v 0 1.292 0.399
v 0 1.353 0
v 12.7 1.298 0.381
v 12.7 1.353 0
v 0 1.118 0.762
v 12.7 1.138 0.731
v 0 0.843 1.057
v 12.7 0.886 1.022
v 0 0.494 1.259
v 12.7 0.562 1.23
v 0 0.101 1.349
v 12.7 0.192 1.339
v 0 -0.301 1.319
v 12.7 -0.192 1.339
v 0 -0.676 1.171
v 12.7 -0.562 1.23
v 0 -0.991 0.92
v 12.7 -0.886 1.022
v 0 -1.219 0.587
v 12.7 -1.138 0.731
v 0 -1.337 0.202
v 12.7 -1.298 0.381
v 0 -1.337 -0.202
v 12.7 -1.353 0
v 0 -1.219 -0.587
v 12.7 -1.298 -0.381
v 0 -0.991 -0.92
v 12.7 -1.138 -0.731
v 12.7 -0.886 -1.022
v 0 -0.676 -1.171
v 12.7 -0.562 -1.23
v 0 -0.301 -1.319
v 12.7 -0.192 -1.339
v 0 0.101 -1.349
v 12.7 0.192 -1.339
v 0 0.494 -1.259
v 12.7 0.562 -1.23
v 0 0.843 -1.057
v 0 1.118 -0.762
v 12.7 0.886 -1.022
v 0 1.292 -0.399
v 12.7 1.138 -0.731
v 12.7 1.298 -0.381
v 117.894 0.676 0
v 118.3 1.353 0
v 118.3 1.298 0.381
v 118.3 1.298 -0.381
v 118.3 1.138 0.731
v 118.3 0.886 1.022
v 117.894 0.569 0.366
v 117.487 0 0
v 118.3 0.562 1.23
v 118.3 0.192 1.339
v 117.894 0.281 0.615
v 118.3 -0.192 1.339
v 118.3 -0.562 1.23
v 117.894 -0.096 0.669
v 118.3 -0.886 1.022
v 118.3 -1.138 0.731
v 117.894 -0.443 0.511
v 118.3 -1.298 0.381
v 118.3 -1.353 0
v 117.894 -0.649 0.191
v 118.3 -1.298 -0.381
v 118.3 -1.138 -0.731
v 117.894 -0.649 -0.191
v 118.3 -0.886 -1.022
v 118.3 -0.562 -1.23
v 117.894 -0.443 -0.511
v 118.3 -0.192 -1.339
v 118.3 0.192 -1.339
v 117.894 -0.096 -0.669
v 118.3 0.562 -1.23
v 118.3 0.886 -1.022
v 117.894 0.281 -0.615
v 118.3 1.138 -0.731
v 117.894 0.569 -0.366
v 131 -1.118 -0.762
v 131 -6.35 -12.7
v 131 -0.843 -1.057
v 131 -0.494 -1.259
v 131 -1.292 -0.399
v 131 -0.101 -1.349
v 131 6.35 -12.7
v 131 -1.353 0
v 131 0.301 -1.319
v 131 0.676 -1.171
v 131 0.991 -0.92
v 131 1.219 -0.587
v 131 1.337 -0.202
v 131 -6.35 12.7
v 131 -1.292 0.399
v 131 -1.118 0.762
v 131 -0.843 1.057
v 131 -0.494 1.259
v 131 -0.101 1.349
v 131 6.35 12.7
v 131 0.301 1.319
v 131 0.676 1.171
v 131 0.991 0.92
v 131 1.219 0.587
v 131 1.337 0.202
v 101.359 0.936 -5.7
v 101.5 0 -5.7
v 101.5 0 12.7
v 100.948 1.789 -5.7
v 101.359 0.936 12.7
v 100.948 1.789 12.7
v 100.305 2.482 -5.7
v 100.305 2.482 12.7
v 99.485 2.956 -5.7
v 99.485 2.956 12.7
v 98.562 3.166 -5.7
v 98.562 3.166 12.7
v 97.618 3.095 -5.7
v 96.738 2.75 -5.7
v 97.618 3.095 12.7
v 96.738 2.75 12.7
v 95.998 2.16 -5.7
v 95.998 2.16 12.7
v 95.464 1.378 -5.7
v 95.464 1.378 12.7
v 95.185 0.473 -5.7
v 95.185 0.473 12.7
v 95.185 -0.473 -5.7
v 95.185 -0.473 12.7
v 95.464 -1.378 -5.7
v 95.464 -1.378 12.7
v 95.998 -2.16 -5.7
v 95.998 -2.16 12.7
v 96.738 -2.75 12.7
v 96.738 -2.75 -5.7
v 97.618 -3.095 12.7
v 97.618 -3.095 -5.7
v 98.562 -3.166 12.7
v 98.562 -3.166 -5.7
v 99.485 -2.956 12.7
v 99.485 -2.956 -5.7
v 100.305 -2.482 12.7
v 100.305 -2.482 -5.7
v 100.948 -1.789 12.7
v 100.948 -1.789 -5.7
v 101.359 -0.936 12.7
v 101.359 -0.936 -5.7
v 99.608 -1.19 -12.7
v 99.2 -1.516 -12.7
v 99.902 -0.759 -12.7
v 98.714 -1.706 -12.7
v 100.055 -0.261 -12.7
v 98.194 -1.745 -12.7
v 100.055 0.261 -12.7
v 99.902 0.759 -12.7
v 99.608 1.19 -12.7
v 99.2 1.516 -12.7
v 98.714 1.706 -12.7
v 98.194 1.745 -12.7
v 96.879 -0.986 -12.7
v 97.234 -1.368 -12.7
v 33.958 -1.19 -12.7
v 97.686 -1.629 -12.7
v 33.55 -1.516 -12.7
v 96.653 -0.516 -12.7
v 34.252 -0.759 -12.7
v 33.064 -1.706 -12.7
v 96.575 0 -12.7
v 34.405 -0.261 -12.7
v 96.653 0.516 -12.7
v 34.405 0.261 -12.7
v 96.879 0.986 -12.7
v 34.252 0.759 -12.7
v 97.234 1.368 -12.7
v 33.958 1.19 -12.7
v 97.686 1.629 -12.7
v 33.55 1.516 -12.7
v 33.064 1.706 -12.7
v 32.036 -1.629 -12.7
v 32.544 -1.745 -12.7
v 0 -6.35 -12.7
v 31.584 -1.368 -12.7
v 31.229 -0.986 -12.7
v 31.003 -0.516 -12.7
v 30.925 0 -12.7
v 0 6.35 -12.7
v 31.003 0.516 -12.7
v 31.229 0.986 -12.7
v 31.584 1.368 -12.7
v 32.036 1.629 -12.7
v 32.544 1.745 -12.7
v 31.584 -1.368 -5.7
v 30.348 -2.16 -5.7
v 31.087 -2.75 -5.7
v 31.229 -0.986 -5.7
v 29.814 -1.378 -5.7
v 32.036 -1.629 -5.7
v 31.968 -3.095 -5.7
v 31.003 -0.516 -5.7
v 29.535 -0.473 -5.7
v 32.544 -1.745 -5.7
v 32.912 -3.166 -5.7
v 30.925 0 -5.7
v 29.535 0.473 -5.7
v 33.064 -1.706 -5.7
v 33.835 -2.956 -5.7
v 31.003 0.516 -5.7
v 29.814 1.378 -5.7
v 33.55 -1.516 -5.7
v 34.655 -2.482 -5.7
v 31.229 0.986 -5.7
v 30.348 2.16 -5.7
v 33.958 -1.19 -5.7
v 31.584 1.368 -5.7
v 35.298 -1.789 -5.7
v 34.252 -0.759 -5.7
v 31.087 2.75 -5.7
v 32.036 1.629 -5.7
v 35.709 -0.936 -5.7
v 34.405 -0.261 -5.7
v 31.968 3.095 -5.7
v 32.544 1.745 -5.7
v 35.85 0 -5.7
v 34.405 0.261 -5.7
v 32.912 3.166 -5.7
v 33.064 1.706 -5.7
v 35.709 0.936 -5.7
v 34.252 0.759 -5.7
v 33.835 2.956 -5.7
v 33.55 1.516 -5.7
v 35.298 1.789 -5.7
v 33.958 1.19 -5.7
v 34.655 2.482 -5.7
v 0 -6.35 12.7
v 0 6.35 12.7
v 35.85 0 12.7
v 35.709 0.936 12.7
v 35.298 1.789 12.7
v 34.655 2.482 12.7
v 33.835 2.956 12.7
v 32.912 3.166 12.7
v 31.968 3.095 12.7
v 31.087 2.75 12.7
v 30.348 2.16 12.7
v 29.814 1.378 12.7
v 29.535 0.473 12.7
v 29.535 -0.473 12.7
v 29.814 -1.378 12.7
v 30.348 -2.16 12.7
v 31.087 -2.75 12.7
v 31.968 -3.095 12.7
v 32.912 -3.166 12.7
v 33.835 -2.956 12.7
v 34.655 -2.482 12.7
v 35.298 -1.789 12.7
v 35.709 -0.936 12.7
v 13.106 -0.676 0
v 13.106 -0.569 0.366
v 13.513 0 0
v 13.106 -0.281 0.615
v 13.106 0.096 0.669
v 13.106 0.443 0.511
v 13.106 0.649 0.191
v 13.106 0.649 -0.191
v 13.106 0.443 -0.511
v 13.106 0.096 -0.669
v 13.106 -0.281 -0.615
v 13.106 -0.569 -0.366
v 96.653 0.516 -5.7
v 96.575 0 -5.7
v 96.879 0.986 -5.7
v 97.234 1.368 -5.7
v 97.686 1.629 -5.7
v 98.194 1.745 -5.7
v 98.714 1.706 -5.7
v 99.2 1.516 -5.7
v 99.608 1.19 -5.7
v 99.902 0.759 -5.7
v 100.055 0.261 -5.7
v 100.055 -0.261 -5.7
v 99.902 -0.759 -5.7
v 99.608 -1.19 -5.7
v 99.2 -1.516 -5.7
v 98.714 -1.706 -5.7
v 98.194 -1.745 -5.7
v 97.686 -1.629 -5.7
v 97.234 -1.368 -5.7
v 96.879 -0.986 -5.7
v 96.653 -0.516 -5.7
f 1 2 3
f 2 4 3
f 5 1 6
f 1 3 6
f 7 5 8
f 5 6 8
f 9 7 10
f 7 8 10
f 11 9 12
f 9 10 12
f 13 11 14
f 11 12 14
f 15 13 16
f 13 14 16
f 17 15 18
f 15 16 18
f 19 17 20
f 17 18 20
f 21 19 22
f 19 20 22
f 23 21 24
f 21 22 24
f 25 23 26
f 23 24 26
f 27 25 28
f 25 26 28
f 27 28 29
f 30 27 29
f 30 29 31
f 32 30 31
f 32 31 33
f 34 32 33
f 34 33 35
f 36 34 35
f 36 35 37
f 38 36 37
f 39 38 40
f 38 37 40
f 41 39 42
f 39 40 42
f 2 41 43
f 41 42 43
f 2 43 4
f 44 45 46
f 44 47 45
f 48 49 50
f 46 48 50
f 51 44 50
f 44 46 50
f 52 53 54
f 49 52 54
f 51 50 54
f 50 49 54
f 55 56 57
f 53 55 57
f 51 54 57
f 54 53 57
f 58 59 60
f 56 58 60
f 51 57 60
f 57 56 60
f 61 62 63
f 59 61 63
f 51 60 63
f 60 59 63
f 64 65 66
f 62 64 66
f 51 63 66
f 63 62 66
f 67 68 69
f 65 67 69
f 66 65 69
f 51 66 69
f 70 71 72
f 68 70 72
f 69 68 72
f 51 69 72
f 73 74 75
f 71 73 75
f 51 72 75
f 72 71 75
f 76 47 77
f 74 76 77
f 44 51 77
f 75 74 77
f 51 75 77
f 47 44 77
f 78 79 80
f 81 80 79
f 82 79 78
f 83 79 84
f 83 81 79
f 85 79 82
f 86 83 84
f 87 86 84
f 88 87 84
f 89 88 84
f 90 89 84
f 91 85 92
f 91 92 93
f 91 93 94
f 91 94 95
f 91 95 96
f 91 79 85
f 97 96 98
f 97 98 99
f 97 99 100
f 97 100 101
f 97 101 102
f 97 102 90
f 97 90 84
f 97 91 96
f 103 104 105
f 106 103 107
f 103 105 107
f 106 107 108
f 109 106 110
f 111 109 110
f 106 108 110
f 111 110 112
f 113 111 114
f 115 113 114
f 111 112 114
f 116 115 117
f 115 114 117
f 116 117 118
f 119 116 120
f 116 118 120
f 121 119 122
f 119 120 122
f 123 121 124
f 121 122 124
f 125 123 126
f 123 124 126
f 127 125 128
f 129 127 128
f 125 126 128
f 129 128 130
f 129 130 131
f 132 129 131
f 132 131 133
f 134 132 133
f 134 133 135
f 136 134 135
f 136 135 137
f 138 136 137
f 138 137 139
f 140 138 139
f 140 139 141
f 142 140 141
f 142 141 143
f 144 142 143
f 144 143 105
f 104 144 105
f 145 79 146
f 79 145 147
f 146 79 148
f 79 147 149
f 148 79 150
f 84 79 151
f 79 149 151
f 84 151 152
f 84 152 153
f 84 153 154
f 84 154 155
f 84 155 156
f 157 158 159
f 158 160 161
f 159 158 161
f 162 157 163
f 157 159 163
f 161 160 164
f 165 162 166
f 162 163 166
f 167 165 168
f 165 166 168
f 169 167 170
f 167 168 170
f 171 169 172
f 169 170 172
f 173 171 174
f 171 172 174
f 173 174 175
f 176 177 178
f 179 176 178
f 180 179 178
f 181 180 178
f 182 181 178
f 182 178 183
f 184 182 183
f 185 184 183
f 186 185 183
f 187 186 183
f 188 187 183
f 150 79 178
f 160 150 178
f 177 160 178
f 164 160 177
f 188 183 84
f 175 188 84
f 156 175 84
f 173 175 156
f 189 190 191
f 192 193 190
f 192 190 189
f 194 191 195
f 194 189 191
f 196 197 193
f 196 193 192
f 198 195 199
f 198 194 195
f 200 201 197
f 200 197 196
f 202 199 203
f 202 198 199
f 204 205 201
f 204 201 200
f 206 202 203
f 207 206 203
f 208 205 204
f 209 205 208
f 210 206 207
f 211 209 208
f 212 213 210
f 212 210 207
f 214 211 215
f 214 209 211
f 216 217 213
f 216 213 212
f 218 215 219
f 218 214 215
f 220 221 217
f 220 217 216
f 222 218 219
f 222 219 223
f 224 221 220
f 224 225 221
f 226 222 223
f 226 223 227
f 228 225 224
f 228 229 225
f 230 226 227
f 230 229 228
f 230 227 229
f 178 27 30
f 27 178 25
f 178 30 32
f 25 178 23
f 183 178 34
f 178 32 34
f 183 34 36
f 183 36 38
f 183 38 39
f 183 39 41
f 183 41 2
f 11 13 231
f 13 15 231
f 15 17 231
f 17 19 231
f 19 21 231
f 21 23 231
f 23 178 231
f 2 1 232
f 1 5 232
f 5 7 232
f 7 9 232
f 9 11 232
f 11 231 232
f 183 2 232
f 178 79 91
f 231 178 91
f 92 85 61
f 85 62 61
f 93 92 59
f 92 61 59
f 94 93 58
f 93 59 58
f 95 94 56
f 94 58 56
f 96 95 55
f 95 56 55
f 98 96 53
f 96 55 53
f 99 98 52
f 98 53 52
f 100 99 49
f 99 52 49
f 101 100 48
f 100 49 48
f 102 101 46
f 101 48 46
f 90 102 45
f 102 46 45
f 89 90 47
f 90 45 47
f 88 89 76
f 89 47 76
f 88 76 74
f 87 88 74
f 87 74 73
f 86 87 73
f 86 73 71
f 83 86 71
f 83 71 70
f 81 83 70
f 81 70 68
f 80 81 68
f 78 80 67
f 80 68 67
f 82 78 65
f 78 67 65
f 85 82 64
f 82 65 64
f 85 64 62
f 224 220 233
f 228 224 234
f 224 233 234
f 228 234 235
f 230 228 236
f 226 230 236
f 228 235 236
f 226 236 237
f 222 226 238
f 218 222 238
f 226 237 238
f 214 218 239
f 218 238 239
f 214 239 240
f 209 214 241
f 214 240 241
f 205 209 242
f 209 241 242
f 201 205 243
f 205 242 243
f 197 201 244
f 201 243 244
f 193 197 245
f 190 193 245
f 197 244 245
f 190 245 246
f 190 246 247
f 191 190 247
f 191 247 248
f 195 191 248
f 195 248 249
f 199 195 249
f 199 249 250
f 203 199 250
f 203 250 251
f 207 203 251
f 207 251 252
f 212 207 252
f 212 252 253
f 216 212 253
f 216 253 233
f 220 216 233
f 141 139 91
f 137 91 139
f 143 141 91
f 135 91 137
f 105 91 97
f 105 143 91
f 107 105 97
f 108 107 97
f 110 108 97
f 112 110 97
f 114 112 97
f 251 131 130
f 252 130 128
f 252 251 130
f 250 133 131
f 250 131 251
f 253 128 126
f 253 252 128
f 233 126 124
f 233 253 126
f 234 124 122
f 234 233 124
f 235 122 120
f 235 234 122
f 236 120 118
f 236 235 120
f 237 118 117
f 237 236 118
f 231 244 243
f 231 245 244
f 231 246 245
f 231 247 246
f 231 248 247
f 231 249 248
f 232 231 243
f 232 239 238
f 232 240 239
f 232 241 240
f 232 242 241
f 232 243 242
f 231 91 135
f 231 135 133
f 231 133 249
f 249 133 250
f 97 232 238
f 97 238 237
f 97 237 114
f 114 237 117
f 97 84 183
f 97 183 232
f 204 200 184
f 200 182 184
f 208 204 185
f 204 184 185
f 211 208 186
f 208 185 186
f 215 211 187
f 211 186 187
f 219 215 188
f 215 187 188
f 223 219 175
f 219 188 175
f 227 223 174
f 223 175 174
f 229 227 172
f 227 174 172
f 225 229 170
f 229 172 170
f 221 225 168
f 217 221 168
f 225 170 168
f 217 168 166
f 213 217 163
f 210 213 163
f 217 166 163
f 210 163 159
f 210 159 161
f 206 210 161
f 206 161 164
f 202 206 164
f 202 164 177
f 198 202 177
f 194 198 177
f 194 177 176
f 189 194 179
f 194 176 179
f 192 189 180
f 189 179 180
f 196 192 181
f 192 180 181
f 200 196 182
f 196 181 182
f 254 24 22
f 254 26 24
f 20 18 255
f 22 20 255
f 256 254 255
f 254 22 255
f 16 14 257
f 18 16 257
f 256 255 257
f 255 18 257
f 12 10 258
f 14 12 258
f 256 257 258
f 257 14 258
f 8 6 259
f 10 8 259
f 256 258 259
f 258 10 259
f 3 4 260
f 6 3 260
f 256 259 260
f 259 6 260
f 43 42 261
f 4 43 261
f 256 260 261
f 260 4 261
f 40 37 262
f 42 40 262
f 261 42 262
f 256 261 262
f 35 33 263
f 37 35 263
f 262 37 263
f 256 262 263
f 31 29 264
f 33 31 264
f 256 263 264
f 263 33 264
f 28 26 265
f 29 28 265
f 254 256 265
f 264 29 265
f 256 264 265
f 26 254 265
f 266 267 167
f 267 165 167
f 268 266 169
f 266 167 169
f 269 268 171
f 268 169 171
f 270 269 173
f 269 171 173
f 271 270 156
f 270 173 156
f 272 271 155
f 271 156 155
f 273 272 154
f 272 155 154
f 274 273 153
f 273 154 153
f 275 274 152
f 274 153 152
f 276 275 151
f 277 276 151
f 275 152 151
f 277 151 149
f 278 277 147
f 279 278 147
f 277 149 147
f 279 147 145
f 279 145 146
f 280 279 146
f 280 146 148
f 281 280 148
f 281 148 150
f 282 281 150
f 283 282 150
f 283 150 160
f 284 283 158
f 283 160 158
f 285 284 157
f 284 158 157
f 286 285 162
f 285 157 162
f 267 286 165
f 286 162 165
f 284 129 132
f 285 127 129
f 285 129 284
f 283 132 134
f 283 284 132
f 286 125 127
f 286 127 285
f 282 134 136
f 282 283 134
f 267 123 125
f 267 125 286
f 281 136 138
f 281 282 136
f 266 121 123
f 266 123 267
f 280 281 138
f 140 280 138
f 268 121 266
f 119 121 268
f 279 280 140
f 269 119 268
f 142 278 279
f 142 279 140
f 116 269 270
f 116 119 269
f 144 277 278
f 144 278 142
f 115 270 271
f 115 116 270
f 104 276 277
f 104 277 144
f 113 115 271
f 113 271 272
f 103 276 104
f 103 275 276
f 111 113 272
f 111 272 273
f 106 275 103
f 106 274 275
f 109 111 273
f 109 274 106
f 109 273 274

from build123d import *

# Parameters (mm, degrees)
F0_W           = 12.7
F0_H           = 25.4
F1_DEPTH       = 131
F3_D           = 3.5
F3_CBORE_D     = 6.35
F3_CBORE_DEPTH = 18.4
F5_D           = 2.7051
F5_DEPTH       = 12.7
F5_TIP         = 0.8126940303
F7_D           = 2.7051
F7_DEPTH       = 12.7
F7_TIP         = 0.8126940303


with BuildPart() as f1:
    # F0 (on Right) → F1 (new body)
    with BuildSketch(Plane.YZ):
        Rectangle(F0_W, F0_H)
    extrude(amount=F1_DEPTH)

    # F3 (through all)
    with Locations(Plane.XY.offset(12.7)):
        with Locations((32.675, 0), (98.325, 0)):
            CounterBoreHole(F3_D / 2, F3_CBORE_D / 2, F3_CBORE_DEPTH)

    # F5
    with Locations(Plane.YZ.offset(131)):
        with Locations((0, 0)):
            Hole(F5_D / 2, depth=F5_DEPTH)
            with Locations((0, 0, -(F5_DEPTH + F5_TIP / 2))):  # 118° drill point
                Cone(0, F5_D / 2, F5_TIP, mode=Mode.SUBTRACT)

    # F7
    with Locations(Plane(origin=(0, 0, 0), x_dir=(0, -1, 0), z_dir=(-1, 0, 0))):
        with Locations((0, 0)):
            Hole(F7_D / 2, depth=F7_DEPTH)
            with Locations((0, 0, -(F7_DEPTH + F7_TIP / 2))):  # 118° drill point
                Cone(0, F7_D / 2, F7_TIP, mode=Mode.SUBTRACT)


solid = f1.part
